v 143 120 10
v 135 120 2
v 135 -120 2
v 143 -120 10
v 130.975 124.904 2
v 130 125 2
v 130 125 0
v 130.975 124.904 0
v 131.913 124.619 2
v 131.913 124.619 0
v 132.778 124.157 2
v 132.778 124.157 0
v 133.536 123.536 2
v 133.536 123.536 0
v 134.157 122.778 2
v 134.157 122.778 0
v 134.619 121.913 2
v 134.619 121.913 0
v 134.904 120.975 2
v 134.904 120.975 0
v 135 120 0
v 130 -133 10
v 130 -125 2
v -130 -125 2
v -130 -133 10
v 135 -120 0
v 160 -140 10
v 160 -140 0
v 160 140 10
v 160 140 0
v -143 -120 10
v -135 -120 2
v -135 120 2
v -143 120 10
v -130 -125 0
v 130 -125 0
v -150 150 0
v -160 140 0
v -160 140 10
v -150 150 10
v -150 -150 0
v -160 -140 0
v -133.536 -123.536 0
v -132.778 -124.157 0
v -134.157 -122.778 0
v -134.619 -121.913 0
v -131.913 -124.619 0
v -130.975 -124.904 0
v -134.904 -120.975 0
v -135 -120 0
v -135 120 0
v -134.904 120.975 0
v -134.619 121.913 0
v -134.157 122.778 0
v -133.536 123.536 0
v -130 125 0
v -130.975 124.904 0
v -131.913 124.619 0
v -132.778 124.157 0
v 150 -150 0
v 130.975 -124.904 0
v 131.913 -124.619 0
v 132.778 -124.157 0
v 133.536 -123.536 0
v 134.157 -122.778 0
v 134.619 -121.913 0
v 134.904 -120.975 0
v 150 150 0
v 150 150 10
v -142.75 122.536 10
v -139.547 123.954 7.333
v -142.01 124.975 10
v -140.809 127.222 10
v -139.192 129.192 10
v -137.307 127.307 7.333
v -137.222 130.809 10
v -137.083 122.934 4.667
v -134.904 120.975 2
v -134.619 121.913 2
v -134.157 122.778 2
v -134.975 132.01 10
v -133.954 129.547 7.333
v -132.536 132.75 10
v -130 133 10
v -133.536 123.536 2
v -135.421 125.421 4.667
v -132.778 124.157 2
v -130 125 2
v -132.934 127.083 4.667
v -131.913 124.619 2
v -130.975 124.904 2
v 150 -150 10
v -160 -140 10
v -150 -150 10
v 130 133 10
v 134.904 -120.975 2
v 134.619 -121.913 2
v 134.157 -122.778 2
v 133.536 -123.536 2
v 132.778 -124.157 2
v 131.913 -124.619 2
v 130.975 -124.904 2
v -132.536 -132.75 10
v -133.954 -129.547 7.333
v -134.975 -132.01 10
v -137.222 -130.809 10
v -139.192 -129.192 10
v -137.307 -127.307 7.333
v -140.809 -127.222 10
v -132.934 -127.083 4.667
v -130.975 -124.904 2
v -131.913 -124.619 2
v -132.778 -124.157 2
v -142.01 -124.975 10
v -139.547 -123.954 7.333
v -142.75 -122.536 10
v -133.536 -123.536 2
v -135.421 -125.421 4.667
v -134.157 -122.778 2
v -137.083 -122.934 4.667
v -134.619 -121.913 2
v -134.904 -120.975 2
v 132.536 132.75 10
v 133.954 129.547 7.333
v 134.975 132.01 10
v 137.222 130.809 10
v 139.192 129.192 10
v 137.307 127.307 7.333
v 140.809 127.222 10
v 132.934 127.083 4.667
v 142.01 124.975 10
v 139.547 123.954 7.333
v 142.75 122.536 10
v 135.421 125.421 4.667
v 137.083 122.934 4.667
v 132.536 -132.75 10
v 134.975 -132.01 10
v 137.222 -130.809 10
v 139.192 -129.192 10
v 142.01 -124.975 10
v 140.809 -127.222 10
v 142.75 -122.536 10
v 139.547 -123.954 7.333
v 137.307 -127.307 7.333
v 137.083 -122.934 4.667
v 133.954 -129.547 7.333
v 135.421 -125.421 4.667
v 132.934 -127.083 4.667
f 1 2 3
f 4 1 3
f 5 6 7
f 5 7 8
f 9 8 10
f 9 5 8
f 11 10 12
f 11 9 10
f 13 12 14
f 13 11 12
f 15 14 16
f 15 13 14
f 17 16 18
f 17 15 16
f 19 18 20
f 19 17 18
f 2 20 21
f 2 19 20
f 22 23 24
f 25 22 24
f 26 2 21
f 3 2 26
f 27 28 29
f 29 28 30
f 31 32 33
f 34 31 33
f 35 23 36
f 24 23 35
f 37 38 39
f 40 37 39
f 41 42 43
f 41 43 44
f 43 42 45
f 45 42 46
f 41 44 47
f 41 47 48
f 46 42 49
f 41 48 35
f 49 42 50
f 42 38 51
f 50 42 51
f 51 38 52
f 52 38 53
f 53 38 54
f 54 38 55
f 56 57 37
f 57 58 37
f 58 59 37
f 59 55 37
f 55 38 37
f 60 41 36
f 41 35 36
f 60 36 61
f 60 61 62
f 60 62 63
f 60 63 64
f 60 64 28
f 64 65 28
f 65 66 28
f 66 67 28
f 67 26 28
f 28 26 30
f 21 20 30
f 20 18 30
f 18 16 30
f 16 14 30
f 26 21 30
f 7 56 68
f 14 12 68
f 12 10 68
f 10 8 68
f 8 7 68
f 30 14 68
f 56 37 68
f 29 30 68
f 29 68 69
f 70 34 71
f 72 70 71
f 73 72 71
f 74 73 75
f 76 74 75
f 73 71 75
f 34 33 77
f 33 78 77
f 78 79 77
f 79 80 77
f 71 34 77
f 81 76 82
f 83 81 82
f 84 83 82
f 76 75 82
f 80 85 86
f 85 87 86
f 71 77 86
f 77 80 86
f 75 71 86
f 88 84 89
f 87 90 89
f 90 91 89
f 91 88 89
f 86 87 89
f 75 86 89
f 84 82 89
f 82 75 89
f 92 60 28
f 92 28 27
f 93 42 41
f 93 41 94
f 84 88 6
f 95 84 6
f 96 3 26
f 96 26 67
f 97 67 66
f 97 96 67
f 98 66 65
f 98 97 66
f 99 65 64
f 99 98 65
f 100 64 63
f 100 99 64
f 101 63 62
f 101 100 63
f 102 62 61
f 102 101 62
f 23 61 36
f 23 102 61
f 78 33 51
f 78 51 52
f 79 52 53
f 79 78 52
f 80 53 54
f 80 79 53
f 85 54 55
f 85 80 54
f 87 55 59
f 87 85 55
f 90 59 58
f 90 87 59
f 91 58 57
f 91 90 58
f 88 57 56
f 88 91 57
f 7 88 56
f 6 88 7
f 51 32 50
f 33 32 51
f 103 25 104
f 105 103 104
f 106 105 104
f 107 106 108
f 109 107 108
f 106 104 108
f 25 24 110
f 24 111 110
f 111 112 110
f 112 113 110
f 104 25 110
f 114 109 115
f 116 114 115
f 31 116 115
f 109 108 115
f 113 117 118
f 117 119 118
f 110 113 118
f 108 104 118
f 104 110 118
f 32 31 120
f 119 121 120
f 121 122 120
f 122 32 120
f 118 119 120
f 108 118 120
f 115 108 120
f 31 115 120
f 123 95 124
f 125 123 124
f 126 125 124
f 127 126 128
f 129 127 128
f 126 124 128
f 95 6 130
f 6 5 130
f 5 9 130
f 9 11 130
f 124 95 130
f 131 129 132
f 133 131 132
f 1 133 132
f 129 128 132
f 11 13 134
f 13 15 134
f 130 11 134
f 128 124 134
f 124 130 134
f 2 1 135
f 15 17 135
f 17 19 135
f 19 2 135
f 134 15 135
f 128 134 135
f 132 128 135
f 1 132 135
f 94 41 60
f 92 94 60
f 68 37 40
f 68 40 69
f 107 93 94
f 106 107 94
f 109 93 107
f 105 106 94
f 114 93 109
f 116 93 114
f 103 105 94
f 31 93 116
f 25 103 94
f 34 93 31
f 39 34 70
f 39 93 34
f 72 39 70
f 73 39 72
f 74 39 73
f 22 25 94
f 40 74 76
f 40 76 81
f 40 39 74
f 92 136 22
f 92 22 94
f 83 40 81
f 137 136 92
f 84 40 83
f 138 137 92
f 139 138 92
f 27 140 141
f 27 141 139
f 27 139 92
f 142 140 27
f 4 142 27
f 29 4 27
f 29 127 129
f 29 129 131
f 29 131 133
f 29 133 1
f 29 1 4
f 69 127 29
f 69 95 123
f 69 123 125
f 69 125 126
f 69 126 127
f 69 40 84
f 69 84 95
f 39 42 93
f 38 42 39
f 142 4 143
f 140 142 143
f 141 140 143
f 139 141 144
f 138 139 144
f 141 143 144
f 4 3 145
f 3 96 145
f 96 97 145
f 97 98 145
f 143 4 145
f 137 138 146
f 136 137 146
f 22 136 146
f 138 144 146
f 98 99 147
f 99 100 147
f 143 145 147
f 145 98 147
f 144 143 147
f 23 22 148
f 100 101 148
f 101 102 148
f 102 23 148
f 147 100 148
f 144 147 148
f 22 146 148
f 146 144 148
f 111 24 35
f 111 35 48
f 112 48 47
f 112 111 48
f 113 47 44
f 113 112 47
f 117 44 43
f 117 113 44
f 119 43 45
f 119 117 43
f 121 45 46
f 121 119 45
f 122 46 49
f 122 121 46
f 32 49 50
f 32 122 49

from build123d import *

# Parameters (mm, degrees)
SKETCH_1_W          = 320
SKETCH_1_H          = 300
EXTRUDE_1_DEPTH     = 10
CHAMFER_1_SIZE      = 10
CUT_EXTRUDE_1_REACH = 221.545
CHAMFER_2_SIZE      = 8


with BuildPart() as part:
    # 草图1 → 凸台-拉伸1 (new body)
    with BuildSketch(Plane.XY):
        Rectangle(SKETCH_1_W, SKETCH_1_H)
    extrude(amount=EXTRUDE_1_DEPTH)

    # 倒角1
    chamfer_1_edges = [part.edges().sort_by_distance(p)[0] for p in [
        (160, -150, 5),
        (-160, -150, 5),
        (-160, 150, 5),
        (160, 150, 5),
    ]]
    chamfer(chamfer_1_edges, length=CHAMFER_1_SIZE)

    # 草图2 → 切除-拉伸1 (cut, up to next)
    with BuildSketch(Plane.XY.offset(10), mode=Mode.PRIVATE) as cut_extrude_1_sk1:
        with BuildLine():
            Line((-130, 125), (130, 125))
            ThreePointArc((130, 125), (133.535533906, 123.535533906), (135, 120))
            Line((135, 120), (135, -120))
            ThreePointArc((135, -120), (133.535533906, -123.535533906), (130, -125))
            Line((130, -125), (-130, -125))
            ThreePointArc((-130, -125), (-133.535533906, -123.535533906), (-135, -120))
            Line((-135, -120), (-135, 120))
            ThreePointArc((-135, 120), (-133.535533906, 123.535533906), (-130, 125))
        make_face()
    cut_extrude_1_tool1 = extrude(cut_extrude_1_sk1.sketch, amount=-CUT_EXTRUDE_1_REACH, mode=Mode.PRIVATE) & part.part
    add(cut_extrude_1_tool1.solids().sort_by_distance((0, 0, 10))[0], mode=Mode.SUBTRACT)

    # 倒角2
    chamfer_2_edges = [part.edges().sort_by_distance(p)[0] for p in [
        (-133.535533906, -123.535533906, 10),
        (0, -125, 10),
        (133.535533906, -123.535533906, 10),
        (135, 0, 10),
        (133.535533906, 123.535533906, 10),
        (0, 125, 10),
        (-133.535533906, 123.535533906, 10),
        (-135, 0, 10),
    ]]
    chamfer(chamfer_2_edges, length=CHAMFER_2_SIZE)


solid = part.part
